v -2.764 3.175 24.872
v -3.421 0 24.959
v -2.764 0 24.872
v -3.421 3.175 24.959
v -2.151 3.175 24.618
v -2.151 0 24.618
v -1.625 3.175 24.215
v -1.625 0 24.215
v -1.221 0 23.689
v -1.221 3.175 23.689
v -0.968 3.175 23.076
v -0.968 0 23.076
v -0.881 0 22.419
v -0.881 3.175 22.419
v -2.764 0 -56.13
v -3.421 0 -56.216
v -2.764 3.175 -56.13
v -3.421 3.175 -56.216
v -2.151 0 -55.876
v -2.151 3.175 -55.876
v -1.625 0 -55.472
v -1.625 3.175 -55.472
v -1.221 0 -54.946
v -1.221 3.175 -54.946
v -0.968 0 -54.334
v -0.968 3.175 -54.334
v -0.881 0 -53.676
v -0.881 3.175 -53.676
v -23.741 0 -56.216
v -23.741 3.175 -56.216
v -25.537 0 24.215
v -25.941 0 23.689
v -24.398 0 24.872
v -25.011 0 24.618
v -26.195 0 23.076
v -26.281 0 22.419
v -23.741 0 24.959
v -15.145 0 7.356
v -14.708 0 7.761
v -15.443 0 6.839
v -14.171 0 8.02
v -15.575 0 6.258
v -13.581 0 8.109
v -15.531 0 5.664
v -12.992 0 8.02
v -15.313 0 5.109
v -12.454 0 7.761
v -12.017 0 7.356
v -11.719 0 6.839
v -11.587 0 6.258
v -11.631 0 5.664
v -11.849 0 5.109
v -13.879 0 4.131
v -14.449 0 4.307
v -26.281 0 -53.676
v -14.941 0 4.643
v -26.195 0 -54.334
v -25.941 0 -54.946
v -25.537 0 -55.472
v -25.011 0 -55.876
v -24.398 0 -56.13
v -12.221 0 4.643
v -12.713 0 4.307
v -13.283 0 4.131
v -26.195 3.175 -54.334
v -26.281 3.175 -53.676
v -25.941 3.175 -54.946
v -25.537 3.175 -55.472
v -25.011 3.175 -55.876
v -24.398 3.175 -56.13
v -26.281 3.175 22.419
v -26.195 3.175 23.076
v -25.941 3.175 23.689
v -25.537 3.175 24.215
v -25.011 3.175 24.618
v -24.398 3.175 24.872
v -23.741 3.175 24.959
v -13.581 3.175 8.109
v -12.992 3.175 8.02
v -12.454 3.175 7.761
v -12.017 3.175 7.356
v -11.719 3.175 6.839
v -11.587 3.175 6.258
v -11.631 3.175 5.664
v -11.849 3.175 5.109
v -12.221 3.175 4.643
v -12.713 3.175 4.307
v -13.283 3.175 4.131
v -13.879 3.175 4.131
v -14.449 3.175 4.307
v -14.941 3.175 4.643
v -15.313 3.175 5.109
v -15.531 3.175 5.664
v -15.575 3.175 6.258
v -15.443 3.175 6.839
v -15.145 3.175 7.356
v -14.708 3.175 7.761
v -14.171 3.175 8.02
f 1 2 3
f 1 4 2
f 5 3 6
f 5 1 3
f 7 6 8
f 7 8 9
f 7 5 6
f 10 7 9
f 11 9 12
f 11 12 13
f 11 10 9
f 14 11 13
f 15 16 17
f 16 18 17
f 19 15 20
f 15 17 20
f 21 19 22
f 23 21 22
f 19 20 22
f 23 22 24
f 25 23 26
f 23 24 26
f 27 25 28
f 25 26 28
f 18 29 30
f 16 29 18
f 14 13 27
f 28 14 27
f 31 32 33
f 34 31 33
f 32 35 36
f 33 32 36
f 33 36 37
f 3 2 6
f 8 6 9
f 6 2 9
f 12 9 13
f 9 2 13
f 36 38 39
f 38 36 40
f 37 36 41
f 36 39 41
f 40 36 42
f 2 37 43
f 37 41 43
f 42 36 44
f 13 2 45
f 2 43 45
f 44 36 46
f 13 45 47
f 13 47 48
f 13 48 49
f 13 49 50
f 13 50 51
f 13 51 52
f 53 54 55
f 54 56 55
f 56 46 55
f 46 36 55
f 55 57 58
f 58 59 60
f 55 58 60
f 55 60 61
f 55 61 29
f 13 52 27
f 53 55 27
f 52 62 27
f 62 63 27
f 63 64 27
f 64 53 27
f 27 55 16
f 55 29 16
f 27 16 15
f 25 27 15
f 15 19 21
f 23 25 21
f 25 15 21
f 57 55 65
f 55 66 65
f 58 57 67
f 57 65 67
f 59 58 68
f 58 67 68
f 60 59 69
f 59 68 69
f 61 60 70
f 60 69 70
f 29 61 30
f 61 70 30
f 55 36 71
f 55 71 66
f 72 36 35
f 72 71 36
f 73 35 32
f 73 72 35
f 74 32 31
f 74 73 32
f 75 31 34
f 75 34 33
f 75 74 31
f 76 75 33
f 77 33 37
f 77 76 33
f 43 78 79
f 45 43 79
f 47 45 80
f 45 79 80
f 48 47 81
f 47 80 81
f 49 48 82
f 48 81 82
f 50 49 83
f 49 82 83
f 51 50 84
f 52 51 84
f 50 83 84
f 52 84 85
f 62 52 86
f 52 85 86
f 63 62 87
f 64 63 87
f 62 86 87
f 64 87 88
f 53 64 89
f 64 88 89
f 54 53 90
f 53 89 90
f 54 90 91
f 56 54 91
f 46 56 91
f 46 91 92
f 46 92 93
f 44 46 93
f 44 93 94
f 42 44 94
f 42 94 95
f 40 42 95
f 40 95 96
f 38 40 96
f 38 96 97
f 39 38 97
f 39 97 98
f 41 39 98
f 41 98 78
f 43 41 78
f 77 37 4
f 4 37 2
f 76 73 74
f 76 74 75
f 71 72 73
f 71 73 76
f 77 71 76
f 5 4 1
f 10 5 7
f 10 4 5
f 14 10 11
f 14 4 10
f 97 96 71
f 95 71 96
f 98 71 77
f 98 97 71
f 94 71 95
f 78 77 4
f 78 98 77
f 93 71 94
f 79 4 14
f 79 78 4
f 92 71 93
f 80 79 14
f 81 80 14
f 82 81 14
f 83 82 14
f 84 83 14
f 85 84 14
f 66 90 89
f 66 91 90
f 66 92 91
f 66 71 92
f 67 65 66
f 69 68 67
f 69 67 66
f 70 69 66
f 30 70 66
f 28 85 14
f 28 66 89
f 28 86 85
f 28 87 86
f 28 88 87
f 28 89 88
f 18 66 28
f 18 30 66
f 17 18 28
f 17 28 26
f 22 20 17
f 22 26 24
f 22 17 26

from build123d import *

# Parameters (mm, degrees)
SKETCH1_W           = 25.4
SKETCH1_H           = 81.175
BOSS_EXTRUDE1_DEPTH = 3.175
SKETCH2_R           = 2
CUT_EXTRUDE1_DEPTH  = 63.137257853
FILLET1_R           = 2.54


with BuildPart() as part:
    # Sketch1 → Boss-Extrude1 (new body)
    with BuildSketch(Plane(origin=(0, 0, 0), x_dir=(1, 0, 0), z_dir=(0, 1, 0))):
        with Locations((-13.581081081, 15.628716216)):
            Rectangle(SKETCH1_W, SKETCH1_H)
    extrude(amount=BOSS_EXTRUDE1_DEPTH)

    # Sketch2 → Cut-Extrude1 (cut, through all)
    with BuildSketch(Plane(origin=(0, 3.175, 0), x_dir=(1, 0, 0), z_dir=(0, 1, 0))):
        with Locations(Location((-13.581081081, -6.108783784, 0), (0, 0, 270))):
            Circle(SKETCH2_R)
    extrude(amount=-CUT_EXTRUDE1_DEPTH, mode=Mode.SUBTRACT)

    # Fillet1
    fillet1_edges = [part.edges().sort_by_distance(p)[0] for p in [
        (-26.281081081, 1.5875, -56.216216216),
        (-0.881081081, 1.5875, -56.216216216),
        (-0.881081081, 1.5875, 24.958783784),
        (-26.281081081, 1.5875, 24.958783784),
    ]]
    fillet(fillet1_edges, radius=FILLET1_R)


solid = part.part
